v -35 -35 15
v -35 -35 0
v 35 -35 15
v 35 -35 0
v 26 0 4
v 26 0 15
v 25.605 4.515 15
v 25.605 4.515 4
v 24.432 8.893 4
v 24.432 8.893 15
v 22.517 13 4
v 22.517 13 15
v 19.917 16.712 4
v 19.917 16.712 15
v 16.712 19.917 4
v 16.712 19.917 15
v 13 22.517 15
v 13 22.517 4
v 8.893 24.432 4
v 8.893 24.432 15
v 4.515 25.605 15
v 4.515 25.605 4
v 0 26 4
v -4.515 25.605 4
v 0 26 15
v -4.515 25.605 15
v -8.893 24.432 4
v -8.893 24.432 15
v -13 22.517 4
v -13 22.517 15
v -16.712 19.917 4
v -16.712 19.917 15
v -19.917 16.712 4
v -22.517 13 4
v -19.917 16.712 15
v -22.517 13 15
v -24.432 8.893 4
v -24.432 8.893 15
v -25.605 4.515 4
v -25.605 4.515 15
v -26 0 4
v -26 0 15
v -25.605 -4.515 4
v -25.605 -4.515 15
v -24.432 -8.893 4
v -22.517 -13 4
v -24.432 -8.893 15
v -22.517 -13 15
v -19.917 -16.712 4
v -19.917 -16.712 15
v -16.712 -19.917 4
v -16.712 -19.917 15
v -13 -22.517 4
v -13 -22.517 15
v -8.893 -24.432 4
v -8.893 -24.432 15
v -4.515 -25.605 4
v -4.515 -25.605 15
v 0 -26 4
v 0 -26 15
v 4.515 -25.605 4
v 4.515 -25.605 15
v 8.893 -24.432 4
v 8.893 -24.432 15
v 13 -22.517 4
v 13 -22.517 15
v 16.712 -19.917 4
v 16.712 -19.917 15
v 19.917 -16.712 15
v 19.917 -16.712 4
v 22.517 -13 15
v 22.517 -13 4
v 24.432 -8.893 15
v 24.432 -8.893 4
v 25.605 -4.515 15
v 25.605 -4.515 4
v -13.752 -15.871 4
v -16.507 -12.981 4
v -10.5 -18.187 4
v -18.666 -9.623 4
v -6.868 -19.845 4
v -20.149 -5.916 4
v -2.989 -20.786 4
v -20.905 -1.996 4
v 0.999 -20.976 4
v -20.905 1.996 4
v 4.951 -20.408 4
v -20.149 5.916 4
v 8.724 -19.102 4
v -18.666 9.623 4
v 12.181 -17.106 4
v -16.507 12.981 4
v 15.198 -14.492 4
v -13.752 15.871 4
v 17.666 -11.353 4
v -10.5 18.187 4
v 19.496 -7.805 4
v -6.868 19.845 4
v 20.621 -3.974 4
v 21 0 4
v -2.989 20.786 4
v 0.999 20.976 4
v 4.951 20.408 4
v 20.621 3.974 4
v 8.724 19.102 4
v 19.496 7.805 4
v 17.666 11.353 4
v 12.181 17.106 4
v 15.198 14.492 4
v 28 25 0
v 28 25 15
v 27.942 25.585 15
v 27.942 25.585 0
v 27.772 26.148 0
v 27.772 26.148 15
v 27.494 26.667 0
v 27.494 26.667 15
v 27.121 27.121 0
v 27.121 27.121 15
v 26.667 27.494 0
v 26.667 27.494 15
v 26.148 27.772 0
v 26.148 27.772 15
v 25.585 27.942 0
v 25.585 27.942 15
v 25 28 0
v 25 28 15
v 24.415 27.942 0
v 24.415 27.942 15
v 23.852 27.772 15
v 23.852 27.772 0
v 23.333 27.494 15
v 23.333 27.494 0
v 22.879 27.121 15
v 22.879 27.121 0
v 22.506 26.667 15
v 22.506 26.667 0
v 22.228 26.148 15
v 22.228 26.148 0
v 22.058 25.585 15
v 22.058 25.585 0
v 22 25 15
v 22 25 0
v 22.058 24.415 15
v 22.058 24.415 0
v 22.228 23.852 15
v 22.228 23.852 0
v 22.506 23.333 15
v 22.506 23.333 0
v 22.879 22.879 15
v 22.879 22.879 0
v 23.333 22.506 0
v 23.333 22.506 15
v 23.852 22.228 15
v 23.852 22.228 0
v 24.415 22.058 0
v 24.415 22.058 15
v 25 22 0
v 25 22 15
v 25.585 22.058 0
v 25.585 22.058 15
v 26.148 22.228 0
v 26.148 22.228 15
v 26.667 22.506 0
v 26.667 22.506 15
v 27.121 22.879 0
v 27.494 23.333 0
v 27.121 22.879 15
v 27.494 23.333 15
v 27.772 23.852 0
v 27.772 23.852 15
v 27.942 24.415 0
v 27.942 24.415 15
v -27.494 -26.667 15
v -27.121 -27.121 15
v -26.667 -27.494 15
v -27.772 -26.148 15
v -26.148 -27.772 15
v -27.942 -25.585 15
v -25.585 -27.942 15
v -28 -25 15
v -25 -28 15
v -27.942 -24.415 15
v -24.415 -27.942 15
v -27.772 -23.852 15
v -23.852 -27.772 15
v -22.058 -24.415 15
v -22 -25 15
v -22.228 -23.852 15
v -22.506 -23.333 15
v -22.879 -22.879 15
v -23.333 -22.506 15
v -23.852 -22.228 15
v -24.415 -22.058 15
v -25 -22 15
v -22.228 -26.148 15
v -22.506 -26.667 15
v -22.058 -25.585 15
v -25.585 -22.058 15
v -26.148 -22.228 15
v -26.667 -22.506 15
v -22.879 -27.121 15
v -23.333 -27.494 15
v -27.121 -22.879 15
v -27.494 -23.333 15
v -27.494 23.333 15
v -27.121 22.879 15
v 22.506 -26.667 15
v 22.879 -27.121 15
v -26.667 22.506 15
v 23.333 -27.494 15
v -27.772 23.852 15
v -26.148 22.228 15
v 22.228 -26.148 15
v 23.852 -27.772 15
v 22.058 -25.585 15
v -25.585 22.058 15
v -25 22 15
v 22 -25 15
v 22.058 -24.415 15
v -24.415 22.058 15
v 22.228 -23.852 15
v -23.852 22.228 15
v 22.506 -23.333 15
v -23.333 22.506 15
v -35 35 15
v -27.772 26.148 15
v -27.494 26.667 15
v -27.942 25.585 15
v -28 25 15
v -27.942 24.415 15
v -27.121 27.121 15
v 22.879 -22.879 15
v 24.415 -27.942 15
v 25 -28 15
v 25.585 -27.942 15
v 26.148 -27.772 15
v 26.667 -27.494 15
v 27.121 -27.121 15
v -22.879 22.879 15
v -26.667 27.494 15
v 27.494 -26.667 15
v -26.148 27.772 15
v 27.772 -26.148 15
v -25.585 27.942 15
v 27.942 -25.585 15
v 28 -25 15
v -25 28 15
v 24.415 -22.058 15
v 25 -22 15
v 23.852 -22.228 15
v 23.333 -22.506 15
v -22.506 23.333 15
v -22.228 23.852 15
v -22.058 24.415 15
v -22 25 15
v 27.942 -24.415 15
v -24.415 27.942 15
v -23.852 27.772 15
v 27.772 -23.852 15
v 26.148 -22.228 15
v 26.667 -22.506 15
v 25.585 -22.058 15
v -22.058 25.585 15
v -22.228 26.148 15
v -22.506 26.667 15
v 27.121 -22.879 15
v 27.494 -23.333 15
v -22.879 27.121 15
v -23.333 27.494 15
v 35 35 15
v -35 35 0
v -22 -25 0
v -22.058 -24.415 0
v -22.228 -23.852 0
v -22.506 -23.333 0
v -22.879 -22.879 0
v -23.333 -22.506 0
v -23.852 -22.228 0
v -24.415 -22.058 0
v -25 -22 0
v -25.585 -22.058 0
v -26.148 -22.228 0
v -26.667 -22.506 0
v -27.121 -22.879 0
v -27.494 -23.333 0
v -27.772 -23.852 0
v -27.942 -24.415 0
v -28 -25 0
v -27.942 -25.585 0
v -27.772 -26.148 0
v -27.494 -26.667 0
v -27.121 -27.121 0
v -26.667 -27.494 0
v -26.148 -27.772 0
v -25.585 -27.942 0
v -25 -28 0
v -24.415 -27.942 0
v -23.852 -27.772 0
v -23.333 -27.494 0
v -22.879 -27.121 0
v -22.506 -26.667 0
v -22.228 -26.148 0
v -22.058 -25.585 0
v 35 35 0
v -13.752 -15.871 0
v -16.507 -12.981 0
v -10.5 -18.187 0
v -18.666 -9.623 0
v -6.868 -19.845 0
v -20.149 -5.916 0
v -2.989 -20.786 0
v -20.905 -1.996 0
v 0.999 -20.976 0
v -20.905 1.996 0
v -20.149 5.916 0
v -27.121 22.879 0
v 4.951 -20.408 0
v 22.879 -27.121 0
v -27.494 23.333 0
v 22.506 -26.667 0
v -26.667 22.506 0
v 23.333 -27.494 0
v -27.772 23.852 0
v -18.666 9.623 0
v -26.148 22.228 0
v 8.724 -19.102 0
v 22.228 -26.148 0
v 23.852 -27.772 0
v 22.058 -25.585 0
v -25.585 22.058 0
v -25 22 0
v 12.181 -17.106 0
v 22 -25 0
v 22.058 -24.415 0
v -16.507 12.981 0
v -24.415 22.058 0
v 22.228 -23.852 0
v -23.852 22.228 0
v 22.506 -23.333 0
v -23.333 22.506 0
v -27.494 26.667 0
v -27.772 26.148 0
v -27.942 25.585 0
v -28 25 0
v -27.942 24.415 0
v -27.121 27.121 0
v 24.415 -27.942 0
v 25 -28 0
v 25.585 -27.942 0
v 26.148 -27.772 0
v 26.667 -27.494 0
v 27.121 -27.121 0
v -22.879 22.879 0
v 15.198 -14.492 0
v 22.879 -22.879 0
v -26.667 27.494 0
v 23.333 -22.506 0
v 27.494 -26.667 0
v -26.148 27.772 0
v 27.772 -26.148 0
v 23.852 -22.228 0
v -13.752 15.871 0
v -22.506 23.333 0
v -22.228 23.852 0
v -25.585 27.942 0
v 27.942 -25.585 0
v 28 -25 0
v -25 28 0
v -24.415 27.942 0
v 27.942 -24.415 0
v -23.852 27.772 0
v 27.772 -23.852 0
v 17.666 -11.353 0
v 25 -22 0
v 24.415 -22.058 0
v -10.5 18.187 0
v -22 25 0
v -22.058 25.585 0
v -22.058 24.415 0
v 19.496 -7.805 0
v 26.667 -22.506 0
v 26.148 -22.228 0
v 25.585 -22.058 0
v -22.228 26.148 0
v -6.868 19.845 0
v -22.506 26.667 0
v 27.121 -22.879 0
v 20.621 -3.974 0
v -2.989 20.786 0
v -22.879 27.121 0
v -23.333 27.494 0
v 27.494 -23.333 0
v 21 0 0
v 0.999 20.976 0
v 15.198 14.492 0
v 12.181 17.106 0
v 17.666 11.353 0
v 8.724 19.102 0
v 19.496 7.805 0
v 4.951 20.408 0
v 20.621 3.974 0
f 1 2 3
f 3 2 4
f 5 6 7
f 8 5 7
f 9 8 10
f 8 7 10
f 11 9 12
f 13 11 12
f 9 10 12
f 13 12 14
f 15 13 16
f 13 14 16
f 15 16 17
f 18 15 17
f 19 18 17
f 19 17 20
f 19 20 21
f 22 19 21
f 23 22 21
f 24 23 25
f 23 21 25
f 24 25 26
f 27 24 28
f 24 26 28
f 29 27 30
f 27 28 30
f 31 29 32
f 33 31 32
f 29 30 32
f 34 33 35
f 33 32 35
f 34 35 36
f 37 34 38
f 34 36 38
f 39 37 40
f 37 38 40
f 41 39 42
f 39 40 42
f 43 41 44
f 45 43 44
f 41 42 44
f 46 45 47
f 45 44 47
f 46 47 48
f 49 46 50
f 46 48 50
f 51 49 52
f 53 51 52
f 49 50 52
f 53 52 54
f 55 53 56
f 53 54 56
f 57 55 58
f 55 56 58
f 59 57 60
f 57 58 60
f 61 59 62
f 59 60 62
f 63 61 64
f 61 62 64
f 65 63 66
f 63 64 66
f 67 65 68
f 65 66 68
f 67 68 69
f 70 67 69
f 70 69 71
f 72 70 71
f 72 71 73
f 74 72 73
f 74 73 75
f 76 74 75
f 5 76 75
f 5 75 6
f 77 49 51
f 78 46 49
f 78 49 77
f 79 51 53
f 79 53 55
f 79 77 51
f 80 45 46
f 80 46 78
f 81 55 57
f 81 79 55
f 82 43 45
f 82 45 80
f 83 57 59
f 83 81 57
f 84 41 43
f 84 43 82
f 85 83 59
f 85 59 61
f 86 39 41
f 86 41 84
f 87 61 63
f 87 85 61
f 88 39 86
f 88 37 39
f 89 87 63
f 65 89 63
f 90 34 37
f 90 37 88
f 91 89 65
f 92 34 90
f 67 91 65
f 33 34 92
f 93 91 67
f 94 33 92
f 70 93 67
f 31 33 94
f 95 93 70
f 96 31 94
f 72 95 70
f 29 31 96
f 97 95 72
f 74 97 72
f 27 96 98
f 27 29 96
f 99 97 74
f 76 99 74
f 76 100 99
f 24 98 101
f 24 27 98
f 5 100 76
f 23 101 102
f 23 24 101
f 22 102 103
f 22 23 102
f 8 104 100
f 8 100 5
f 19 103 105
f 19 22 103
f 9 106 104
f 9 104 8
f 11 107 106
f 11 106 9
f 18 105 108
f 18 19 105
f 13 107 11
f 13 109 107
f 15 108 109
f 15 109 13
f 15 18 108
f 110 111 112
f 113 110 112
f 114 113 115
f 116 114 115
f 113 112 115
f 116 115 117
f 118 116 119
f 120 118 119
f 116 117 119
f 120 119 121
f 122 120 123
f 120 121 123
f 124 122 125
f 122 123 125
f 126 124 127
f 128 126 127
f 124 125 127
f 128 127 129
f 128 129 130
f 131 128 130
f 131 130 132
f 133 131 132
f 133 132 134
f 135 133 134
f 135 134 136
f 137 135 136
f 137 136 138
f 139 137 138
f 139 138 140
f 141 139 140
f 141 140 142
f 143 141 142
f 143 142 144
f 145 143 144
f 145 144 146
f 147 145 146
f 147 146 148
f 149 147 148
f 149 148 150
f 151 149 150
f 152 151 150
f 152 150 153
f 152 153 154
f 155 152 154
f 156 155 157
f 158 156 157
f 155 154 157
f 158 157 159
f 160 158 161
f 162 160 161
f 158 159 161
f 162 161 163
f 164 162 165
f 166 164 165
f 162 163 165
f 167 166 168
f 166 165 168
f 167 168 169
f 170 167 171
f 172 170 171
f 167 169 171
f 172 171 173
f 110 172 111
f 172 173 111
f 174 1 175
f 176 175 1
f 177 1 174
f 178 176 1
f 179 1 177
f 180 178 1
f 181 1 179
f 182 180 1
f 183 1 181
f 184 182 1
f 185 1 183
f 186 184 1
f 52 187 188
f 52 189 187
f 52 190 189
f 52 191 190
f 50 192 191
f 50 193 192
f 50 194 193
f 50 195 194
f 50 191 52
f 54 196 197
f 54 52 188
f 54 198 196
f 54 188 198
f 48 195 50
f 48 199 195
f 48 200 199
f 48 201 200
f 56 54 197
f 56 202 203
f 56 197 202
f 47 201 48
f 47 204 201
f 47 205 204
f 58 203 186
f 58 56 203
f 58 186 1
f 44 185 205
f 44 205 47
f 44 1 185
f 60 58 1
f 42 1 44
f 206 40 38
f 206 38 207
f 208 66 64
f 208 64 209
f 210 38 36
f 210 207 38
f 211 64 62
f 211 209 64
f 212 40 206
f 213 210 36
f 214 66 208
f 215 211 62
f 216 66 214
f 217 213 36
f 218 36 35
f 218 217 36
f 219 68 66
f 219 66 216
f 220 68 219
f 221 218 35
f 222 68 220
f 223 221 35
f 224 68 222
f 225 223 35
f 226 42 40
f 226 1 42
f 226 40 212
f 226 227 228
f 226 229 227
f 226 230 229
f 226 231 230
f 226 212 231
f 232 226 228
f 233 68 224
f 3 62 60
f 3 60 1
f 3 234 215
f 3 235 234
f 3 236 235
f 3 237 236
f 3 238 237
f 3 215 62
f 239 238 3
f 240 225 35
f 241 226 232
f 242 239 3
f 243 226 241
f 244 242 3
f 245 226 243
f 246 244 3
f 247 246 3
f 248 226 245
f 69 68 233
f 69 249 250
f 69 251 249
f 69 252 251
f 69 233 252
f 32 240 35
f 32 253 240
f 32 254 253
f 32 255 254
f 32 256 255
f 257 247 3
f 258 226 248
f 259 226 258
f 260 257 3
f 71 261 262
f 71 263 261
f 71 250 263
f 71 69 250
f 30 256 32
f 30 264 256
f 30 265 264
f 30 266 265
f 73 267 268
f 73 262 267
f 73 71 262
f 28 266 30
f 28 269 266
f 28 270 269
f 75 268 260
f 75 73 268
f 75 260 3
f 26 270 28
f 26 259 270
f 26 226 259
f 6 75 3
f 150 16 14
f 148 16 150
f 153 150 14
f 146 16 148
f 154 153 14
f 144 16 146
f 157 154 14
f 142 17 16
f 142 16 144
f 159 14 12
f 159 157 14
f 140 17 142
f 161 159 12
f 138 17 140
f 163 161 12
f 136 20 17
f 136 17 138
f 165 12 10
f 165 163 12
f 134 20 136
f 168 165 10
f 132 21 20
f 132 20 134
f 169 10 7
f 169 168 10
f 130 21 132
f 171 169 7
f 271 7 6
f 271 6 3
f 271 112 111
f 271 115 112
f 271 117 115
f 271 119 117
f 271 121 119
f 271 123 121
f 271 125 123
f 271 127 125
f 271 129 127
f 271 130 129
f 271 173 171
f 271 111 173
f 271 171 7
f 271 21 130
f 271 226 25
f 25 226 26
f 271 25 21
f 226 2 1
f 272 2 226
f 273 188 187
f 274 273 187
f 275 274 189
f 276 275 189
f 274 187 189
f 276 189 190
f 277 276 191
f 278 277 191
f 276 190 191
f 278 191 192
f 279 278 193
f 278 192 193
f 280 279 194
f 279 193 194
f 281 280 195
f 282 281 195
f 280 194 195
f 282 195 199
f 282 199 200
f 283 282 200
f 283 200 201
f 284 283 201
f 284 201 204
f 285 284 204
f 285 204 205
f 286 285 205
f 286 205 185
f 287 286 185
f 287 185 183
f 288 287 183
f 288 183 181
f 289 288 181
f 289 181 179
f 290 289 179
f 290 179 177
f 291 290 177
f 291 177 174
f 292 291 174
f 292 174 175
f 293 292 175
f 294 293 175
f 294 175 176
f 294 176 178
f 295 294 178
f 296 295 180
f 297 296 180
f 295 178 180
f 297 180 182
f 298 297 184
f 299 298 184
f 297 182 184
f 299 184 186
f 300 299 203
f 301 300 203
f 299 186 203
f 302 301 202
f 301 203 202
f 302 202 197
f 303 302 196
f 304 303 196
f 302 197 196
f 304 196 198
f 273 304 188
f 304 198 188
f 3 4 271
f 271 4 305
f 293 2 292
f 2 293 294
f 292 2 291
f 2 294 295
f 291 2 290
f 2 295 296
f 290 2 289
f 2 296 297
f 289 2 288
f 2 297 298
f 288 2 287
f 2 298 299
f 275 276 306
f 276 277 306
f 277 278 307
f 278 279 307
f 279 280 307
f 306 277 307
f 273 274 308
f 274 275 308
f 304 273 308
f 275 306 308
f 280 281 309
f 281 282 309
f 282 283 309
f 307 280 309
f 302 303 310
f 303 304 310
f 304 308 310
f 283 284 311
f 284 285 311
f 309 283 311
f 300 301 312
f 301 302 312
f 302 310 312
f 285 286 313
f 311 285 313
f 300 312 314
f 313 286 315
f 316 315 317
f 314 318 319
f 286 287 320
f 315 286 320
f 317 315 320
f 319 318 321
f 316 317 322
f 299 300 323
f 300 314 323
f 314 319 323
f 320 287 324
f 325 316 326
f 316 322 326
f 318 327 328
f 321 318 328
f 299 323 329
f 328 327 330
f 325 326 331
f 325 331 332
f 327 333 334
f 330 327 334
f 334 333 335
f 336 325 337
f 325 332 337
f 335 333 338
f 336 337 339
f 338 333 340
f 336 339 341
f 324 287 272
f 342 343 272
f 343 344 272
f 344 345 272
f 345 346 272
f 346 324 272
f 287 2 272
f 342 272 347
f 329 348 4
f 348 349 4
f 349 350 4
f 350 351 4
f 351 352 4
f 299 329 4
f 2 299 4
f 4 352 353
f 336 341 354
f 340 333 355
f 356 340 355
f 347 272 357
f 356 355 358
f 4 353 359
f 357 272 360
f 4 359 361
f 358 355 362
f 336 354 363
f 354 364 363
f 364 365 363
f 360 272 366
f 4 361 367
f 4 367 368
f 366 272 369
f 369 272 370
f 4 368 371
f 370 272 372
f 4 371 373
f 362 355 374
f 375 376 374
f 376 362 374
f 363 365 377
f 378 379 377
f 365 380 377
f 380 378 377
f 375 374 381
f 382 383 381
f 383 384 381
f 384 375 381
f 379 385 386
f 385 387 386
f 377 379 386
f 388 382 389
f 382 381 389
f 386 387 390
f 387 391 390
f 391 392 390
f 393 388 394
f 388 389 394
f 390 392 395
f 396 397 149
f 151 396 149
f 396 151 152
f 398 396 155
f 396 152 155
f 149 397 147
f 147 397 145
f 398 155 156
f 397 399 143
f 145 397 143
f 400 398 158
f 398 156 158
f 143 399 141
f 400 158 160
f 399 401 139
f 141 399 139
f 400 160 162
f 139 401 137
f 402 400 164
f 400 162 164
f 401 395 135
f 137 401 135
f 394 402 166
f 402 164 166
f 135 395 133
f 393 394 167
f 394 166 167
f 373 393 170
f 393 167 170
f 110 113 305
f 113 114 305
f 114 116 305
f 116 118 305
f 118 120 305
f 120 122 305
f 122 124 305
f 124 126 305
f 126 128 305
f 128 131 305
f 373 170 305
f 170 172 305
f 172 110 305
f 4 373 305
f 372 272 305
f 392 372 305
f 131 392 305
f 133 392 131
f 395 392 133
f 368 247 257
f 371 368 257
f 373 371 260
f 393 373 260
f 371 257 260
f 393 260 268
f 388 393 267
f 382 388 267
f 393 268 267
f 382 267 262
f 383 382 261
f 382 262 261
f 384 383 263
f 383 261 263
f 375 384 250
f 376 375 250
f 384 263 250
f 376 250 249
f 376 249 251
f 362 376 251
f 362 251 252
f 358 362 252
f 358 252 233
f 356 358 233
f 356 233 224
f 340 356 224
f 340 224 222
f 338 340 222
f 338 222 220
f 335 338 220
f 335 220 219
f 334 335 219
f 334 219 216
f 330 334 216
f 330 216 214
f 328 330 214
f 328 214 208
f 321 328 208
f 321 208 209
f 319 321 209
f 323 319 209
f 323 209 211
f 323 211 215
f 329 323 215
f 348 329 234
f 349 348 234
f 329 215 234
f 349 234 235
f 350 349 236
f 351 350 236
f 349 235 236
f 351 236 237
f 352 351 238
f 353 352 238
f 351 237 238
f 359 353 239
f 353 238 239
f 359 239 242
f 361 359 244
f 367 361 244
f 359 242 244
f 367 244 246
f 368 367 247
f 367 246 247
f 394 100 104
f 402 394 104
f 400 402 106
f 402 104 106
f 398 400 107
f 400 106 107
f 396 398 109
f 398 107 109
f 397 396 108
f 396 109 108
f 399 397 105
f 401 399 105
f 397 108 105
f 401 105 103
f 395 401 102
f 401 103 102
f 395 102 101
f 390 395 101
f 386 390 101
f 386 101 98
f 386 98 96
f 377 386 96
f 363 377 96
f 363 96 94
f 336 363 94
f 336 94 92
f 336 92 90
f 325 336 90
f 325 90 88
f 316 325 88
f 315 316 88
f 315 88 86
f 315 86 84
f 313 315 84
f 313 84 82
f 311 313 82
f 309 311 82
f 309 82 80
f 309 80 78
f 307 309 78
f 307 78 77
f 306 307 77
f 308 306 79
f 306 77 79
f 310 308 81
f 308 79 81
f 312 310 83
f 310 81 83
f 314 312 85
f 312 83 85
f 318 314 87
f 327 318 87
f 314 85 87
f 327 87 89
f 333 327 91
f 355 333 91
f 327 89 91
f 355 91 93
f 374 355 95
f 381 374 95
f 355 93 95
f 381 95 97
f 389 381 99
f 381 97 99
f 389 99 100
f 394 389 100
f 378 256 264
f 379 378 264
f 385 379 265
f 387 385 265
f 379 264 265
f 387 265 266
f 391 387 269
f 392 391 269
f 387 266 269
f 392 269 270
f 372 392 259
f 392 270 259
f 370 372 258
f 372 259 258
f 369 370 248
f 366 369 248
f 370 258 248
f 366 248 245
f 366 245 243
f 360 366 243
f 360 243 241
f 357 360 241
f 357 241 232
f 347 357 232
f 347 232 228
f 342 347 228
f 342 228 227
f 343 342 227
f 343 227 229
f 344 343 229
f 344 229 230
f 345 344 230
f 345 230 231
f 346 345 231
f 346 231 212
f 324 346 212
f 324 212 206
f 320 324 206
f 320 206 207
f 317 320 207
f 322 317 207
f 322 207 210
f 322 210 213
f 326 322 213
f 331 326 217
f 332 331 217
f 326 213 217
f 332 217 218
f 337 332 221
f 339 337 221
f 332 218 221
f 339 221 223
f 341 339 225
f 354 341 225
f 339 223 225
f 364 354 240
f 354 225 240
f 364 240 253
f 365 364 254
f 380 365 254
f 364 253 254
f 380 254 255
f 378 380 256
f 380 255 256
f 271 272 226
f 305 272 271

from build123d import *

# Parameters (mm, degrees)
SKETCH_W        = 70
SKETCH_H        = 70
PAD_DEPTH       = 15
SKETCH001_R     = 26
POCKET_DEPTH    = 11
SKETCH002_R     = 3
SKETCH002_R_2   = 21
POCKET001_DEPTH = 15.001


with BuildPart() as part:
    # Sketch → Pad (new body)
    with BuildSketch(Plane.XY):
        Rectangle(SKETCH_W, SKETCH_H)
    extrude(amount=PAD_DEPTH)

    # Sketch001 (on Face6 of Pad) → Pocket (cut)
    with BuildSketch(Plane.XY.offset(15)):
        Circle(SKETCH001_R)
    extrude(amount=-POCKET_DEPTH, mode=Mode.SUBTRACT)

    # Sketch002 → Pocket001 (cut, through all)
    with BuildSketch(Plane.XY.offset(15)):
        with Locations((-25, 25)):
            Circle(SKETCH002_R)
        with Locations((25, 25)):
            Circle(SKETCH002_R)
        with Locations((25, -25)):
            Circle(SKETCH002_R)
        with Locations((-25, -25)):
            Circle(SKETCH002_R)
        Circle(SKETCH002_R_2)
    extrude(amount=-POCKET001_DEPTH, mode=Mode.SUBTRACT)


solid = part.part
